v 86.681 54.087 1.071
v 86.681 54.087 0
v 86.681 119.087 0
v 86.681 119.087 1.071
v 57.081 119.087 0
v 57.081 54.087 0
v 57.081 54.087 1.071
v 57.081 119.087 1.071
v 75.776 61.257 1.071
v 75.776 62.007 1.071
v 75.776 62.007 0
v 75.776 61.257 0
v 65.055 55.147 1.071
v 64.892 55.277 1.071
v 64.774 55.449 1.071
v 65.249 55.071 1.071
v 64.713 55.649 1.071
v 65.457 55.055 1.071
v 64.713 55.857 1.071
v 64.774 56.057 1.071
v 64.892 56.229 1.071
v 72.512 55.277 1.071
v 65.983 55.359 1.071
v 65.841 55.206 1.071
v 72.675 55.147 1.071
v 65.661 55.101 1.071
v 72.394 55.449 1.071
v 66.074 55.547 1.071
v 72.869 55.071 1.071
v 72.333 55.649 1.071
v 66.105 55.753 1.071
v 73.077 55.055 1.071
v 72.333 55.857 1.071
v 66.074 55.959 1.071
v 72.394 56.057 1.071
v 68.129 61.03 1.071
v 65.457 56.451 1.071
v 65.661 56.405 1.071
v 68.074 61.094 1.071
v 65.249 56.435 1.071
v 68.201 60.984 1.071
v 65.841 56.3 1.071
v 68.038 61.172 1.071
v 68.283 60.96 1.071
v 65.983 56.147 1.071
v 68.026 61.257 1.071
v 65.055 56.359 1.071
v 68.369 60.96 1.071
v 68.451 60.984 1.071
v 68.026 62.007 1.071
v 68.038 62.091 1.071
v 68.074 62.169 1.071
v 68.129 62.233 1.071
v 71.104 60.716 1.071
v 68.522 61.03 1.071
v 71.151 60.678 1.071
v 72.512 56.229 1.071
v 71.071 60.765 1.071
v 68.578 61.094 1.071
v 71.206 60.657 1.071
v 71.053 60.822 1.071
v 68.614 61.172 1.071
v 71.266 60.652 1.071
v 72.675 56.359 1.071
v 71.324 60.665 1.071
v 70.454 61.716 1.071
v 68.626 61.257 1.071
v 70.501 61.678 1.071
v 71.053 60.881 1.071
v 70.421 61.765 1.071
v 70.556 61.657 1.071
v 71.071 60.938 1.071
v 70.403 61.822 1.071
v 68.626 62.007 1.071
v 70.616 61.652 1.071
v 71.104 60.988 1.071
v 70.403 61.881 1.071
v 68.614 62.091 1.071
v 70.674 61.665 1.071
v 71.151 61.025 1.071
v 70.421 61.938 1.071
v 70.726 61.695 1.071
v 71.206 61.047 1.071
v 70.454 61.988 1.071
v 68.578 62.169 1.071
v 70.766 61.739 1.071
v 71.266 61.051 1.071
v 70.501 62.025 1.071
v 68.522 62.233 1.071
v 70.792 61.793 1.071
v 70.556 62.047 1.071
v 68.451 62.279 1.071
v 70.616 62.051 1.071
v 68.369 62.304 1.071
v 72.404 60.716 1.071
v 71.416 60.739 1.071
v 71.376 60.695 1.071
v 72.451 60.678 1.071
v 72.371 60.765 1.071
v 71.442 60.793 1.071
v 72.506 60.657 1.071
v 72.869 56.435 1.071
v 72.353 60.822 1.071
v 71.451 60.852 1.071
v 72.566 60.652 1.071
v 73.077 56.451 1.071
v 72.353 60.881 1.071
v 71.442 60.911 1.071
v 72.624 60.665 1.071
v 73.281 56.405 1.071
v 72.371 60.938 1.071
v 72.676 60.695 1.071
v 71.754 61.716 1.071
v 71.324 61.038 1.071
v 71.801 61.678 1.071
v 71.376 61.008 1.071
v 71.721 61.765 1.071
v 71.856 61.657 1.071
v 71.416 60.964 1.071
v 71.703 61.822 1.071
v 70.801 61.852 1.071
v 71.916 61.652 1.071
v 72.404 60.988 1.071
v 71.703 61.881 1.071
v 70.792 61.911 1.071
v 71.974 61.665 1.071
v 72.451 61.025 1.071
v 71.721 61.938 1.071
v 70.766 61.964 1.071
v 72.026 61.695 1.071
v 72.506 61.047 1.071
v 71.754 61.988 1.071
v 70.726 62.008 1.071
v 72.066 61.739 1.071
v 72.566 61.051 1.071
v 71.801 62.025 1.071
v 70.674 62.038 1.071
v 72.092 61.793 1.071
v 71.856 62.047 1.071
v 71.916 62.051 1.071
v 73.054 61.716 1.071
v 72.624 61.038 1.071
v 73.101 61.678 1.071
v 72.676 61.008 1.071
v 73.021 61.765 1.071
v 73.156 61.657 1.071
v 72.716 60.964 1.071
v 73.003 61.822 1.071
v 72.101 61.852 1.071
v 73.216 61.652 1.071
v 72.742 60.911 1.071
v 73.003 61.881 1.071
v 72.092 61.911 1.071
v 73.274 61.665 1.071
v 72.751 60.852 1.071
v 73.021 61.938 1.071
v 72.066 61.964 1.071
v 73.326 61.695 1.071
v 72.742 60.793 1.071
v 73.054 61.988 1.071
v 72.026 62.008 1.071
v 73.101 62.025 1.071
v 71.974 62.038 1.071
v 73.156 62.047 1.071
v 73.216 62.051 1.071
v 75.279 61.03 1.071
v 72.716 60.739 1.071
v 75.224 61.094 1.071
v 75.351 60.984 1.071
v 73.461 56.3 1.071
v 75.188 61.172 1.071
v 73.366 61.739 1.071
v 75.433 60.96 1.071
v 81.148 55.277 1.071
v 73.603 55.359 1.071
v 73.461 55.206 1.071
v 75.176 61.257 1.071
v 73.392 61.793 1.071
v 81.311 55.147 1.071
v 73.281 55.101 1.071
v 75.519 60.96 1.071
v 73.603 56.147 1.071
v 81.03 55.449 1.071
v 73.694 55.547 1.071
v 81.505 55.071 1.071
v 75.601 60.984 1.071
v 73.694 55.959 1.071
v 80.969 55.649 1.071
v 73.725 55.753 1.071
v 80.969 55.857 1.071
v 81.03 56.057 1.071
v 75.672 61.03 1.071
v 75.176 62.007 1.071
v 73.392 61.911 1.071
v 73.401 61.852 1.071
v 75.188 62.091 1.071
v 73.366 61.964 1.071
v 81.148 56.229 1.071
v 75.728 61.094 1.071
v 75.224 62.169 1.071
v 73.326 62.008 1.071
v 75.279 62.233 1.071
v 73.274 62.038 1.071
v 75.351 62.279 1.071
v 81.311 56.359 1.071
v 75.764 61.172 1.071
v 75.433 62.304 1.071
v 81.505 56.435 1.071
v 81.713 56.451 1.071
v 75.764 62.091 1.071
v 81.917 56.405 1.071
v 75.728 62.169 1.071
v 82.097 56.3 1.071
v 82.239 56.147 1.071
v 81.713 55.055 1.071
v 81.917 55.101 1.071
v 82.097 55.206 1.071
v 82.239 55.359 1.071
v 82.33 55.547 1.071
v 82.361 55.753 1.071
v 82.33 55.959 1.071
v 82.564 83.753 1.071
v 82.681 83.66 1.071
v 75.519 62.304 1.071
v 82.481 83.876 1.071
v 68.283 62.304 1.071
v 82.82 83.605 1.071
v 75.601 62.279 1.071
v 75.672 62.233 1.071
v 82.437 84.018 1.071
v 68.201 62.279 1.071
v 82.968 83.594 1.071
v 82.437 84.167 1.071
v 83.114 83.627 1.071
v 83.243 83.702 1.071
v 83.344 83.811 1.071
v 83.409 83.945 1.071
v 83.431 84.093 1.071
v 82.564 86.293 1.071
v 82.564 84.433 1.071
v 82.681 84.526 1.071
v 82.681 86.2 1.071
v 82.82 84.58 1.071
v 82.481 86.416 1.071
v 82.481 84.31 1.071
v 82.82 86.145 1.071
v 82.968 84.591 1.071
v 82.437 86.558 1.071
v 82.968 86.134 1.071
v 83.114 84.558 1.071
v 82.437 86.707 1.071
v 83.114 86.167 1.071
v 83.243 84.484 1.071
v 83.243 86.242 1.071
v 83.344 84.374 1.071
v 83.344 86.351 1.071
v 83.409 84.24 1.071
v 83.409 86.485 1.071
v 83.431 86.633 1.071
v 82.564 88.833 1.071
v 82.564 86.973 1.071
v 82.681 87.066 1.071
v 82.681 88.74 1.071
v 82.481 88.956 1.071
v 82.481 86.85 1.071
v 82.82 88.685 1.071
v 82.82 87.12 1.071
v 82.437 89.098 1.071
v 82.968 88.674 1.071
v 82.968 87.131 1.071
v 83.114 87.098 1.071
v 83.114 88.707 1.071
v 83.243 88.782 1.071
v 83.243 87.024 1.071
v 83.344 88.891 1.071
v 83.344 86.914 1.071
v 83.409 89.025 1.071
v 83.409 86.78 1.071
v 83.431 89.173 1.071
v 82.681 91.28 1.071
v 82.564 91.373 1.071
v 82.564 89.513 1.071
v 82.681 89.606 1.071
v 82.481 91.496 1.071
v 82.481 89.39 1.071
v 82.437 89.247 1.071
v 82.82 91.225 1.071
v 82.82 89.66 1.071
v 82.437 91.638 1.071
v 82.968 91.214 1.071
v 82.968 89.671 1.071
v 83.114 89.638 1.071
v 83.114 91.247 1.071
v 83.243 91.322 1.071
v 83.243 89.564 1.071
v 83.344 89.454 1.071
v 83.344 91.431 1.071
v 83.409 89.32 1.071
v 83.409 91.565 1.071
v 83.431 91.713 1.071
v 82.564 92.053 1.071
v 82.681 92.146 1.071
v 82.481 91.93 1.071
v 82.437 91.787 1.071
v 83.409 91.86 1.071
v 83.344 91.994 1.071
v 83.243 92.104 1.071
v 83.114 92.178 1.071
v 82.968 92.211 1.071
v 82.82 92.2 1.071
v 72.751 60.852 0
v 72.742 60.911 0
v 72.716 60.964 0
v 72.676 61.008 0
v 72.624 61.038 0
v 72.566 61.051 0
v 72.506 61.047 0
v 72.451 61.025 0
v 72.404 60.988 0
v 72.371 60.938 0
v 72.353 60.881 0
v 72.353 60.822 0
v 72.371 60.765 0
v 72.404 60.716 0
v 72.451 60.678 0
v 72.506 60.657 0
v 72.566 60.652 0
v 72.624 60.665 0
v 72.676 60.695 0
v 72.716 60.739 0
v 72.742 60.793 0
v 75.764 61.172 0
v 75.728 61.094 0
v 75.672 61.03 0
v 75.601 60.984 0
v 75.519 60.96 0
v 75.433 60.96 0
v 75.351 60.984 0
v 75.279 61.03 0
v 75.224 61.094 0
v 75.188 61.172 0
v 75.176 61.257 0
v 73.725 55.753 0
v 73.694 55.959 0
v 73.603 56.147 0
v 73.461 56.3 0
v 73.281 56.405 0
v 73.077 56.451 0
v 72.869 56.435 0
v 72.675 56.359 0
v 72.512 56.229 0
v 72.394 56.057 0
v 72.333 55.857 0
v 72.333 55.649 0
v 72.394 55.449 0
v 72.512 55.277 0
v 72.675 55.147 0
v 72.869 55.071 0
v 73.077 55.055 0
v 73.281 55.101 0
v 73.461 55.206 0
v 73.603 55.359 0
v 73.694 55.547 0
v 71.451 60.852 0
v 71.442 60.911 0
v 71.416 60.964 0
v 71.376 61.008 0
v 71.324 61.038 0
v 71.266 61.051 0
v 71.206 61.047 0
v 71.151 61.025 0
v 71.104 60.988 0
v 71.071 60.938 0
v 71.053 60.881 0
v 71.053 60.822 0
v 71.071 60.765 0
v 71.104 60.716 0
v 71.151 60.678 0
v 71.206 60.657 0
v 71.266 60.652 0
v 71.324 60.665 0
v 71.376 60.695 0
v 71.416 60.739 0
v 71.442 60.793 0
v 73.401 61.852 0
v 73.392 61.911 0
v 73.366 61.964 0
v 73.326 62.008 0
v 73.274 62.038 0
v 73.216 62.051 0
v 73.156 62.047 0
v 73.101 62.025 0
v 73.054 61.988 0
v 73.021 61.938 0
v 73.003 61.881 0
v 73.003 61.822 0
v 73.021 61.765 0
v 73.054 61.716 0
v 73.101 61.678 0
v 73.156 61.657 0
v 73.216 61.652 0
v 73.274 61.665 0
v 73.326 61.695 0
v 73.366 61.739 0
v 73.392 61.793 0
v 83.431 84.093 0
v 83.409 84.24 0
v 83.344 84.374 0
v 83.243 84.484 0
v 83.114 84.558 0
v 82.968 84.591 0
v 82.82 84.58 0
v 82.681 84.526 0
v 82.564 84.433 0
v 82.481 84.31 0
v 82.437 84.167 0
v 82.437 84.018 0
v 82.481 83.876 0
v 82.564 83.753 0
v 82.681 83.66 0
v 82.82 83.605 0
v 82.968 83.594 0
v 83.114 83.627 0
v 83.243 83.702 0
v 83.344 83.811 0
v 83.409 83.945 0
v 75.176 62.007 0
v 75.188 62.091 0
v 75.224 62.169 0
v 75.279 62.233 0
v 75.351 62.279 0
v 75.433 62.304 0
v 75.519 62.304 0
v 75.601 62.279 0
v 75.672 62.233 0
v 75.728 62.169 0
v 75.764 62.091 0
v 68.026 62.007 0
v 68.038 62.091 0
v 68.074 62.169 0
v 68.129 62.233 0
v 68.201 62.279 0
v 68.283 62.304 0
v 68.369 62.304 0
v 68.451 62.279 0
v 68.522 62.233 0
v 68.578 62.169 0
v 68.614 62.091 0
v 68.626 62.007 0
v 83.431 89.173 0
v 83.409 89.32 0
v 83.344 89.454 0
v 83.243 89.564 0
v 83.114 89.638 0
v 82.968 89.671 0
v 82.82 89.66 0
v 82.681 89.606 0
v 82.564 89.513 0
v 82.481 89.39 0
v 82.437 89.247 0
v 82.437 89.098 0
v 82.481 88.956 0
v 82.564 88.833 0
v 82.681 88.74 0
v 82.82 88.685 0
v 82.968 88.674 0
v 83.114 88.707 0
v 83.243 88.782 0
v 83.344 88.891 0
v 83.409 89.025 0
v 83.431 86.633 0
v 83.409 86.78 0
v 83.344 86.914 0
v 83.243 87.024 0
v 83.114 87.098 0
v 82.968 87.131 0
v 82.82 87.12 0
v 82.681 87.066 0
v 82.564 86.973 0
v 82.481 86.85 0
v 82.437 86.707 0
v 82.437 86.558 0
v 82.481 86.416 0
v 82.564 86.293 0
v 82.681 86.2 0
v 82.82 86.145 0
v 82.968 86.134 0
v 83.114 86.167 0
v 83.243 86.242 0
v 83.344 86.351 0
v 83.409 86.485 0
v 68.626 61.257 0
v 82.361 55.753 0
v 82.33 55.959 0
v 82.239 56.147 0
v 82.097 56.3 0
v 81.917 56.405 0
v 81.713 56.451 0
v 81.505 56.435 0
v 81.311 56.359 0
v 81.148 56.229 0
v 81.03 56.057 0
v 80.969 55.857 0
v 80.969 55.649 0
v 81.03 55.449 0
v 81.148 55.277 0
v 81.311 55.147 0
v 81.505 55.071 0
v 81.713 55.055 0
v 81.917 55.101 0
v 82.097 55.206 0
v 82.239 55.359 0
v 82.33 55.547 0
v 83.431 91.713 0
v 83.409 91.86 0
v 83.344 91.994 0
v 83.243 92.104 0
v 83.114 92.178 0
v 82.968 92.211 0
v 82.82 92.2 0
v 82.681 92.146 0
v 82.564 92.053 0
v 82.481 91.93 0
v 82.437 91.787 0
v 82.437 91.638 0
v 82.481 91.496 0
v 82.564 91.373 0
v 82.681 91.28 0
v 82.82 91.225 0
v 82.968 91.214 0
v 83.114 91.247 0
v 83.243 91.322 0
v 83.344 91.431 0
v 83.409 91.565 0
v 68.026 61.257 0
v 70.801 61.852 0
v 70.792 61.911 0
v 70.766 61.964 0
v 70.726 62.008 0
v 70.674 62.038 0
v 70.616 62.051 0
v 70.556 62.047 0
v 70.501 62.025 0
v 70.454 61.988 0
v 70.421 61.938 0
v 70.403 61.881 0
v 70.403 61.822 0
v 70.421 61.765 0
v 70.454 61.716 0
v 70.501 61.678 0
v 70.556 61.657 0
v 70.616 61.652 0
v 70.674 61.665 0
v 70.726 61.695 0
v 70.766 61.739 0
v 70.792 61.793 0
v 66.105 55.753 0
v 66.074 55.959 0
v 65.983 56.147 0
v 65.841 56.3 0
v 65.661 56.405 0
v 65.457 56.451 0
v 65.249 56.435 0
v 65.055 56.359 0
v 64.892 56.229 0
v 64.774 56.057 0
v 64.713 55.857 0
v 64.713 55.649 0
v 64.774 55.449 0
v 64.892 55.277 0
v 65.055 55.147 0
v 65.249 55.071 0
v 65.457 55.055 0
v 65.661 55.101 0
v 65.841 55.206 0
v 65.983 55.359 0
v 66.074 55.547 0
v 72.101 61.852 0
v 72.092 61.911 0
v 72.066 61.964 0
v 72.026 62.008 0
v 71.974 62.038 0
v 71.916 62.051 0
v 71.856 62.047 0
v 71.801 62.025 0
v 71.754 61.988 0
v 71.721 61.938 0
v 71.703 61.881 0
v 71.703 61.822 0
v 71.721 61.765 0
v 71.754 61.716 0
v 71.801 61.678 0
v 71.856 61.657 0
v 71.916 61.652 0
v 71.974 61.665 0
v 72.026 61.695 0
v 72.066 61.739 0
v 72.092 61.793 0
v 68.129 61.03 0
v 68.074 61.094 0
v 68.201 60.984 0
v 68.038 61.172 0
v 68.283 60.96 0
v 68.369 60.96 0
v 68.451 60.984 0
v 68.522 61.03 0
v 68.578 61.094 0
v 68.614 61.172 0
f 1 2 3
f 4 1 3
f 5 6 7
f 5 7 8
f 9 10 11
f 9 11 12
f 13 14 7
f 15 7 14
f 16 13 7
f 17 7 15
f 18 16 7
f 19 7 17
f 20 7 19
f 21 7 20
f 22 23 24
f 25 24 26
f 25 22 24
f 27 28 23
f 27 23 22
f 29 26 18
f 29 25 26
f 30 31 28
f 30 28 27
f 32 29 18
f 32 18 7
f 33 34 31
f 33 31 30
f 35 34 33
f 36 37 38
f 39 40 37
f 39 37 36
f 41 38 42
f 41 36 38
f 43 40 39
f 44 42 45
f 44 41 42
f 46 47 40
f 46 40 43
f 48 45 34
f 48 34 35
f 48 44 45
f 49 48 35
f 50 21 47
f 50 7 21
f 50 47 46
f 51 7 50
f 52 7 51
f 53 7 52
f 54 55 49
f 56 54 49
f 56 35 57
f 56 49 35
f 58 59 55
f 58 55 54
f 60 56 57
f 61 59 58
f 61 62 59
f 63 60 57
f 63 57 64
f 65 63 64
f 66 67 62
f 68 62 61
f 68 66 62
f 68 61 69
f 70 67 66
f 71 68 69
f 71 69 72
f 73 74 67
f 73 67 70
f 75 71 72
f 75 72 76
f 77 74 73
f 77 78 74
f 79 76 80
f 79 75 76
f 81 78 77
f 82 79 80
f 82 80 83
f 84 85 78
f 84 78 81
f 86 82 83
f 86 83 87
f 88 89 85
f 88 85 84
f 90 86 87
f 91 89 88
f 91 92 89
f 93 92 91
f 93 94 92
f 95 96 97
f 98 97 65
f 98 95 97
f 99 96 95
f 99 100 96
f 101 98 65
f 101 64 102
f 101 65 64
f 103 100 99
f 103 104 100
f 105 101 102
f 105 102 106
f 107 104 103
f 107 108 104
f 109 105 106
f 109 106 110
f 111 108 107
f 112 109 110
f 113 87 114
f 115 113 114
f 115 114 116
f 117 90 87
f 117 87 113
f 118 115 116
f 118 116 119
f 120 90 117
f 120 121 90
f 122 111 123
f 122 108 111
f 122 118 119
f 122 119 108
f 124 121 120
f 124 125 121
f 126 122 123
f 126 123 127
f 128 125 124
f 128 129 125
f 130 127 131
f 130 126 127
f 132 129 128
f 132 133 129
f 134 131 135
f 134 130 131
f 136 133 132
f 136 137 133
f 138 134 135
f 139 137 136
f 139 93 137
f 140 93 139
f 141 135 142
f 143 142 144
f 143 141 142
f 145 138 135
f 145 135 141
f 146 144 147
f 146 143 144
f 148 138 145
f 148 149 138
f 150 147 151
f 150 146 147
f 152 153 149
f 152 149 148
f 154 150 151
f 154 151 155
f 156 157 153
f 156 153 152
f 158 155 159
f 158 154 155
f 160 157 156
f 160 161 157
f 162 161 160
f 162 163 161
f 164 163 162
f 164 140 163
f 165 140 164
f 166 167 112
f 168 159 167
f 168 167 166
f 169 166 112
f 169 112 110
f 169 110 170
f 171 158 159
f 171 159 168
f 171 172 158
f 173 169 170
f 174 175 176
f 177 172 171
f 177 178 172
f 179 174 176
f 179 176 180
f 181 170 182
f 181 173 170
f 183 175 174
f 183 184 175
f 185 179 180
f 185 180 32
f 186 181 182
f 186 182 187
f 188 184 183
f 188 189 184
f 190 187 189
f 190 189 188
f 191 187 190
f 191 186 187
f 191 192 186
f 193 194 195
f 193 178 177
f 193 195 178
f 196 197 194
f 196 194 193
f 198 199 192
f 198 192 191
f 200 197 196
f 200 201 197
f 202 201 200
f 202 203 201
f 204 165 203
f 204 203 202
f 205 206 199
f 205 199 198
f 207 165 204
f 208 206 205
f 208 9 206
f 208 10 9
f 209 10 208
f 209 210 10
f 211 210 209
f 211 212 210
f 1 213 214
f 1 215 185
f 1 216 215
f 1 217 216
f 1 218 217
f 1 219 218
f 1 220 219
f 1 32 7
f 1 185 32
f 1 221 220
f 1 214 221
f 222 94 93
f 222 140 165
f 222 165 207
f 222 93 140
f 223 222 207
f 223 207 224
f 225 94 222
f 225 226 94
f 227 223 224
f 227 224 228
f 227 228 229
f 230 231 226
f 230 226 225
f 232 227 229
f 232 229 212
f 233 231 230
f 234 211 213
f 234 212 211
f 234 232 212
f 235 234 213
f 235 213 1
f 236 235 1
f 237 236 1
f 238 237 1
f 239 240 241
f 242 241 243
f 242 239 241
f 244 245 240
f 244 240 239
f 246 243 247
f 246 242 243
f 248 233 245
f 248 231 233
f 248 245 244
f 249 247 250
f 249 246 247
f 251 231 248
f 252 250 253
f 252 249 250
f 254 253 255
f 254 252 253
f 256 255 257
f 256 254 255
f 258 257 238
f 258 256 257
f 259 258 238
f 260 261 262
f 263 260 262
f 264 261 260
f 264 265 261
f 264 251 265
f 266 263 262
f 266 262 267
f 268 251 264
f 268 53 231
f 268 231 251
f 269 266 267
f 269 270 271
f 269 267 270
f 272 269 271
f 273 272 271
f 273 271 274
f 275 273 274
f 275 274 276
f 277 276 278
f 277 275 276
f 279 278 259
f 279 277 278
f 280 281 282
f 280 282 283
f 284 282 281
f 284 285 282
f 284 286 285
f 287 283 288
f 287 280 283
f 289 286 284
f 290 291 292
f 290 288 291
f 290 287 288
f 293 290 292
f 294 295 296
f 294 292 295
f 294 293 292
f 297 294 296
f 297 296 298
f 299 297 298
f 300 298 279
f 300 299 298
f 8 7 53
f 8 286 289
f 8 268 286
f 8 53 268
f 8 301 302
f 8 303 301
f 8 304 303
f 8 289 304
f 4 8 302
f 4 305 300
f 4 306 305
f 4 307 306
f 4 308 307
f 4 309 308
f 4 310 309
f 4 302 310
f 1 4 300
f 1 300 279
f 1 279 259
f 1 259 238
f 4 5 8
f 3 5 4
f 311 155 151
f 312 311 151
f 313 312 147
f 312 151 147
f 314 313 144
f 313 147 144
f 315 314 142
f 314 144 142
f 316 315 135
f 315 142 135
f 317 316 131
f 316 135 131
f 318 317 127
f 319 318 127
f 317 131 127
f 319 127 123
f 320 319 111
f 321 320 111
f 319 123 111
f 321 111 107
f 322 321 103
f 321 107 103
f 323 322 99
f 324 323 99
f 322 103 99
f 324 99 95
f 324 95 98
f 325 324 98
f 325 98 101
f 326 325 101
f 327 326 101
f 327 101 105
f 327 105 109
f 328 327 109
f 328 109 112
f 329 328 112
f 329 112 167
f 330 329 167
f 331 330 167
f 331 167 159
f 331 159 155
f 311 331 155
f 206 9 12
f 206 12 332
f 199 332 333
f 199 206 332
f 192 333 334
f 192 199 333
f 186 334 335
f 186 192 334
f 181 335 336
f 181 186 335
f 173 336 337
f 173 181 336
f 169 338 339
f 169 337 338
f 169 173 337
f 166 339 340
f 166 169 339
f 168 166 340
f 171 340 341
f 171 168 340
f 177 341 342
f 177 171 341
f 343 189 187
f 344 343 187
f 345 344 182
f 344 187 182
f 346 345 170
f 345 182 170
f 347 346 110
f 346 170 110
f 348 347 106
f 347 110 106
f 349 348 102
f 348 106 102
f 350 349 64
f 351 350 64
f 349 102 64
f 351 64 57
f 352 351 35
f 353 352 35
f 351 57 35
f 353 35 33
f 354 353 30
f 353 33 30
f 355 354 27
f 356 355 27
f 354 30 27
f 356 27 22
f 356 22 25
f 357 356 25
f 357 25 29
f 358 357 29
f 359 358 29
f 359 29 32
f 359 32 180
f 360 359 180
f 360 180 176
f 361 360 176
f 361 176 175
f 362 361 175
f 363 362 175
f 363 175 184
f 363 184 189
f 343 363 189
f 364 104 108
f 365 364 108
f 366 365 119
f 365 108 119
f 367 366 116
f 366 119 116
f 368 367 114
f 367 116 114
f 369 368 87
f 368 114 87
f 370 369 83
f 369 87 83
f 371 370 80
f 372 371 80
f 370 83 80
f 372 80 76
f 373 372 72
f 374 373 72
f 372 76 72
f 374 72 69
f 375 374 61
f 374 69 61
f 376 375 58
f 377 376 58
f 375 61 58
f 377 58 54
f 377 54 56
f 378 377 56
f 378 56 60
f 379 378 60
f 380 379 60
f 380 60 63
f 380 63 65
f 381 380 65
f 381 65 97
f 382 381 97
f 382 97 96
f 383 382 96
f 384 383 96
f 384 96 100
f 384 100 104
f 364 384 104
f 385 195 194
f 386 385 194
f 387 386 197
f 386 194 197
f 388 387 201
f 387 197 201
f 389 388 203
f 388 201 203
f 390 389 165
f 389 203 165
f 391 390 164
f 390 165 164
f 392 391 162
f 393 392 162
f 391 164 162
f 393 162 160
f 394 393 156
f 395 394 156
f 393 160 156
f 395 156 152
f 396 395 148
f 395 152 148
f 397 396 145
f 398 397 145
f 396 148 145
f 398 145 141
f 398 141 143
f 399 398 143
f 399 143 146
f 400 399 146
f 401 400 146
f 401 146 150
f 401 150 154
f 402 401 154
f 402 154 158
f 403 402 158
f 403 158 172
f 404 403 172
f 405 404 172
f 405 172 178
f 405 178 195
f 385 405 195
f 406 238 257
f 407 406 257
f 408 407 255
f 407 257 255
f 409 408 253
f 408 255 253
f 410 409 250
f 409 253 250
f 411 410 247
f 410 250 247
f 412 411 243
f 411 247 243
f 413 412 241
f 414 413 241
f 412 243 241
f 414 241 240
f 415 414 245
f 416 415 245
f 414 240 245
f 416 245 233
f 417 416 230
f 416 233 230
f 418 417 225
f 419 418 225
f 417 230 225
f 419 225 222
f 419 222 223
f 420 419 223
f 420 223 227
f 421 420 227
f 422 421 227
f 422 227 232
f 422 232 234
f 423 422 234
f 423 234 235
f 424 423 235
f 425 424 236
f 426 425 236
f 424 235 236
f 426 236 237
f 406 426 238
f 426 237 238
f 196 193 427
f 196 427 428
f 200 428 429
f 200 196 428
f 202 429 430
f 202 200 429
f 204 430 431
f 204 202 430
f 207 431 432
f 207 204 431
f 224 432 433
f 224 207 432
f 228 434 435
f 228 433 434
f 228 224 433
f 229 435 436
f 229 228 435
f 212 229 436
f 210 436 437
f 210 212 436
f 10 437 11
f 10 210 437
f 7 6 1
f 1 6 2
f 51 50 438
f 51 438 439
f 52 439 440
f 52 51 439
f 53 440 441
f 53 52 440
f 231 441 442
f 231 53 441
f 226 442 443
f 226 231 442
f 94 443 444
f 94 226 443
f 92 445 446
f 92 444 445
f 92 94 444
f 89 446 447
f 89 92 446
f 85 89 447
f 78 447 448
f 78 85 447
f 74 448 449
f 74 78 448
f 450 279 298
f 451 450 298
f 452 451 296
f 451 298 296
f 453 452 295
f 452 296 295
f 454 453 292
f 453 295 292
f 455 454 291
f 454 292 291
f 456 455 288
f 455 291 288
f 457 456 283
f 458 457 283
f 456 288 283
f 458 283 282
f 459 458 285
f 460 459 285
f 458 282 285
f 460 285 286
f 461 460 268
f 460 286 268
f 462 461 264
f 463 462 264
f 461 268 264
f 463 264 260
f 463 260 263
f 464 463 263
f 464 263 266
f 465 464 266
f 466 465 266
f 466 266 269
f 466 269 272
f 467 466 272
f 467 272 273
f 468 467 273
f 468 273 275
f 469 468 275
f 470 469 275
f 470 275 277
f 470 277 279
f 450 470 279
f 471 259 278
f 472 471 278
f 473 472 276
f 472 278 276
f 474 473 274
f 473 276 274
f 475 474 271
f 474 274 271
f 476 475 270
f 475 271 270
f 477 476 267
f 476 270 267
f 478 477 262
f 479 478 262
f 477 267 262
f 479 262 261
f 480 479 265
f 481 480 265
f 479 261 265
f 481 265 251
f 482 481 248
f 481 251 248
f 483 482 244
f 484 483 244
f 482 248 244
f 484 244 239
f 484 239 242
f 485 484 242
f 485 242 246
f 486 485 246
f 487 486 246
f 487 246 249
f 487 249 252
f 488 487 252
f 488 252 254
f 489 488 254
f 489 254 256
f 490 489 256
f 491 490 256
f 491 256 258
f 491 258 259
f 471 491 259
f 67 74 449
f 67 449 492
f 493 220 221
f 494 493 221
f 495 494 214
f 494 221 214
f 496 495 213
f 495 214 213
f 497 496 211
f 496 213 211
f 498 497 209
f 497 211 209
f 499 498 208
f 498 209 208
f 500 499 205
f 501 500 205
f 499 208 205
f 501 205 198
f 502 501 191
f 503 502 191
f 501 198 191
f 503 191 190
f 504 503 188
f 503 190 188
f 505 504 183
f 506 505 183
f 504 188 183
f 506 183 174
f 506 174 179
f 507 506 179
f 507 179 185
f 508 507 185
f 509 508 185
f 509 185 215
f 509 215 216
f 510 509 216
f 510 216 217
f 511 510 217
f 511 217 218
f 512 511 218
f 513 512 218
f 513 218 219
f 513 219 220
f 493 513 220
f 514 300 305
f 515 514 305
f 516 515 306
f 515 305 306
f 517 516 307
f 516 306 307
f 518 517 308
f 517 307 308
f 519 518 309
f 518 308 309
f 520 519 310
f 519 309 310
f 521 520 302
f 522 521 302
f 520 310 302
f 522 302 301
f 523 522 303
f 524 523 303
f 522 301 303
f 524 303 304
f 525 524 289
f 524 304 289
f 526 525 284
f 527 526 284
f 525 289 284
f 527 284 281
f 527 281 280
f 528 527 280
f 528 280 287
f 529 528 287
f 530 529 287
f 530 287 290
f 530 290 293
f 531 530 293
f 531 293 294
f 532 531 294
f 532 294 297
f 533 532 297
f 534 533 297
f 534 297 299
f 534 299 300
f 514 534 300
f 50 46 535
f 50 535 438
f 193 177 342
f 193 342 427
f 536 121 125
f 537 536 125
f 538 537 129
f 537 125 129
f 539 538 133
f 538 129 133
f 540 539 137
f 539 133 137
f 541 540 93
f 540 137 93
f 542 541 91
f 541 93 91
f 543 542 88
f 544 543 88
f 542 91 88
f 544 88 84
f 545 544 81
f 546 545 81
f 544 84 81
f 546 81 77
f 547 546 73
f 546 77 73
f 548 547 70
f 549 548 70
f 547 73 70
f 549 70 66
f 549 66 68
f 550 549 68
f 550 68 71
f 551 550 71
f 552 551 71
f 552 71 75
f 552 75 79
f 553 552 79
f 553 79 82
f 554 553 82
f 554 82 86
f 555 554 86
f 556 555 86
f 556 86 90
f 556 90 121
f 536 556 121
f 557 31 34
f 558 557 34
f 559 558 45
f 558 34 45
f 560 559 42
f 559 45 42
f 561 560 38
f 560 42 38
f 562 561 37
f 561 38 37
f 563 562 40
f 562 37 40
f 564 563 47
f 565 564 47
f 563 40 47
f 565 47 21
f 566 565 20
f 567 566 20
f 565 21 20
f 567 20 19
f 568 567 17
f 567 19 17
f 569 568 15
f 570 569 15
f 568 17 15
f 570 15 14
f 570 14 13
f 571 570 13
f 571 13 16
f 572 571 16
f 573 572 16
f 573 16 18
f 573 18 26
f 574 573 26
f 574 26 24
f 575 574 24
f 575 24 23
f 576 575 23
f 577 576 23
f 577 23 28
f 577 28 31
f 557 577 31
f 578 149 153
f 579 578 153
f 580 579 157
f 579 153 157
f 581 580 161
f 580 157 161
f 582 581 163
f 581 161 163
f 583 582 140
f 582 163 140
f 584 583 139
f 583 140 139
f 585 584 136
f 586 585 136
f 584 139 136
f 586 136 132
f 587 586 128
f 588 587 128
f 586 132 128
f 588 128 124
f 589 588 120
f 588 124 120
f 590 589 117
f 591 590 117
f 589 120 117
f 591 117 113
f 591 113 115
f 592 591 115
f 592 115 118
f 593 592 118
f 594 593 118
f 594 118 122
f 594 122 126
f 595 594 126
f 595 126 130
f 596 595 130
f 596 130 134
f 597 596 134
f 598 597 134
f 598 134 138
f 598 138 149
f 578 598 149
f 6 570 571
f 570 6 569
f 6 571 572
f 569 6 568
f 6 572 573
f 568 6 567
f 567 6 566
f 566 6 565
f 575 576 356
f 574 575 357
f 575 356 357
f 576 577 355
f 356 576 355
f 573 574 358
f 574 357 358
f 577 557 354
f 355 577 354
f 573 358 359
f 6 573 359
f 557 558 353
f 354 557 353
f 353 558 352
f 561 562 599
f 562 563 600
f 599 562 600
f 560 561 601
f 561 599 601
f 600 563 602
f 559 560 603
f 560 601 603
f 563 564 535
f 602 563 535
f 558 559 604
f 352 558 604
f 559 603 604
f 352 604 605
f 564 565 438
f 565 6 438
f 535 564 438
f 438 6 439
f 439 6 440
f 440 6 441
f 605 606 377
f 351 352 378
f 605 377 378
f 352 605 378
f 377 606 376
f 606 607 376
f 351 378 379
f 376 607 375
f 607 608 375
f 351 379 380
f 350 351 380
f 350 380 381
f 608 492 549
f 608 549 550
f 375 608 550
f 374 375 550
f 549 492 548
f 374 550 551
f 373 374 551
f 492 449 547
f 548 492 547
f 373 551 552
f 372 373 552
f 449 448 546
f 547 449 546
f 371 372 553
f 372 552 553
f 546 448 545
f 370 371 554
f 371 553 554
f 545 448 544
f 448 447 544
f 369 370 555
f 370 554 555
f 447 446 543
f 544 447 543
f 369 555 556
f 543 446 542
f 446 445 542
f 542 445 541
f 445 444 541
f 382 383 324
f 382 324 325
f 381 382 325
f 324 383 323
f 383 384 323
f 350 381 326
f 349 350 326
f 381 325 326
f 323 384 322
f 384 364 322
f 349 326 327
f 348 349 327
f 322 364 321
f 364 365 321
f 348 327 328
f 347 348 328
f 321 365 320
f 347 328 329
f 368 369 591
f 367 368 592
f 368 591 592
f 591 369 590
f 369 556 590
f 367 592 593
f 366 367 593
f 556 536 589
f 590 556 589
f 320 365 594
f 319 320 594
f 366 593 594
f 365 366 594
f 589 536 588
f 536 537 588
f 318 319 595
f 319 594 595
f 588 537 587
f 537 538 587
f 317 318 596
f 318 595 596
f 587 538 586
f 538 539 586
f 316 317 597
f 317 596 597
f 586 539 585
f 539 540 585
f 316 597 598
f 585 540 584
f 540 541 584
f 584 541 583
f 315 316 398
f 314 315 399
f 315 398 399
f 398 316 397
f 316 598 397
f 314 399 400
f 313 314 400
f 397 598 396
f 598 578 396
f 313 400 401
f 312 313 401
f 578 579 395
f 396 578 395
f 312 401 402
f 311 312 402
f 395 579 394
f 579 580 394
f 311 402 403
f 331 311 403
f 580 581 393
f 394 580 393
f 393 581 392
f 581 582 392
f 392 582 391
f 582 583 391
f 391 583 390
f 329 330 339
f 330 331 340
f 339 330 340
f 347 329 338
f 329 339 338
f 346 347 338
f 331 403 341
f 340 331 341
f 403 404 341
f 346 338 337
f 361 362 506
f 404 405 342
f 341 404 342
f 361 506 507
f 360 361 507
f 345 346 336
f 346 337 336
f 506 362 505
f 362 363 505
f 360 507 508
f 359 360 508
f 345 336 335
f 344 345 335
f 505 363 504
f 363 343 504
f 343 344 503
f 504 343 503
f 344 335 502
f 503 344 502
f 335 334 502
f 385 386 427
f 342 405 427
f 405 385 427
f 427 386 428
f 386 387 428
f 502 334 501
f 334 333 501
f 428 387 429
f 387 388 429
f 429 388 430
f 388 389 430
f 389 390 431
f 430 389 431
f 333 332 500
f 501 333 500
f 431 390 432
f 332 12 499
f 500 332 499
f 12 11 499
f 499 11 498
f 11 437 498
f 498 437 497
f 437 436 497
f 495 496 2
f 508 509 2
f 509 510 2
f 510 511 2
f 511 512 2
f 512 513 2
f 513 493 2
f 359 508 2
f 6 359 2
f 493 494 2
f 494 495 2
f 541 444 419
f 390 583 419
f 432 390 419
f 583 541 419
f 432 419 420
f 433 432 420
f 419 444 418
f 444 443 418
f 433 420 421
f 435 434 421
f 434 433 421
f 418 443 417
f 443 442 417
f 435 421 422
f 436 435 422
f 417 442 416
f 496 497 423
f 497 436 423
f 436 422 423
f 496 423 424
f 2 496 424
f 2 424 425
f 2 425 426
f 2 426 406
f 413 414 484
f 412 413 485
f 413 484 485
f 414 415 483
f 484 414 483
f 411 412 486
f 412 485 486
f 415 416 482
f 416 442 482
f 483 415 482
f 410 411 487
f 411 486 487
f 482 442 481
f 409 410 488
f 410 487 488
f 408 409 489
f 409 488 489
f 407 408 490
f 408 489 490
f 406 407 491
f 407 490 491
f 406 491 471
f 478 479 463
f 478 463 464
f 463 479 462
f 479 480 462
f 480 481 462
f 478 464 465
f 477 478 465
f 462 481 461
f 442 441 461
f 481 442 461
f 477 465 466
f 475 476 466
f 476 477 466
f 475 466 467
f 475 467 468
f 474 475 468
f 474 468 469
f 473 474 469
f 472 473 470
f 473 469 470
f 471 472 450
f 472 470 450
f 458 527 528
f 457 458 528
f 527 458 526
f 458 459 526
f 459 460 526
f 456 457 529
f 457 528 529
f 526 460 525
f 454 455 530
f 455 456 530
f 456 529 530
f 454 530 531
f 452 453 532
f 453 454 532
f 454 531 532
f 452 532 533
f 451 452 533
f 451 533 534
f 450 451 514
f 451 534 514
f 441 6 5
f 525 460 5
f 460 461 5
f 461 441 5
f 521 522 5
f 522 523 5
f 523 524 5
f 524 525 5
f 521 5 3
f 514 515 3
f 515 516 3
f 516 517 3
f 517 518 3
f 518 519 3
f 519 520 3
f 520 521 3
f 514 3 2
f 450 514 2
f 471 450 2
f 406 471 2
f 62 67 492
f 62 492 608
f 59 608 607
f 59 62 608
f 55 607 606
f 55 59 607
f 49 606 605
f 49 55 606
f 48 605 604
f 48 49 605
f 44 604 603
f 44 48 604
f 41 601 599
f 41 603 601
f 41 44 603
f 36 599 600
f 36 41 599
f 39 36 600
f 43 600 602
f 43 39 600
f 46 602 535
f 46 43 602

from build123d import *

# Parameters (mm, degrees)
SKETCH_1_W         = 29.6
SKETCH_1_H         = 65
BOARD_DEPTH        = 1.07112
SKETCH_13_R        = 0.5
HOLE_OLED1_4_DEPTH = 1.07112
SKETCH_14_R        = 0.5
HOLE_OLED1_3_DEPTH = 148.296881579
SKETCH_15_R        = 0.5
HOLE_OLED1_2_DEPTH = 148.296881579
SKETCH_16_R        = 0.5
HOLE_OLED1_1_DEPTH = 148.296881579
SKETCH_17_R        = 0.7
HOLE_FREE_4_DEPTH  = 148.296881579
SKETCH_18_R        = 0.7
HOLE_FREE_3_DEPTH  = 148.296881579
SKETCH_19_R        = 0.7
HOLE_FREE_2_DEPTH  = 148.296881579
HOLE_J1_6_DEPTH    = 148.296881579
HOLE_J1_7_DEPTH    = 148.296881579
SKETCH_24_R        = 0.2
HOLE_J1_1_DEPTH    = 148.296881579
SKETCH_25_R        = 0.2
HOLE_J1_2_DEPTH    = 148.296881579
SKETCH_26_R        = 0.2
HOLE_J1_3_DEPTH    = 148.296881579
SKETCH_27_R        = 0.2
HOLE_J1_4_DEPTH    = 148.296881579
SKETCH_28_R        = 0.2
HOLE_J1_5_DEPTH    = 148.296881579


with BuildPart() as part:
    # Эскиз1 → Board (new body)
    with BuildSketch(Plane.XY):
        with Locations((71.88103, 86.58662)):
            Rectangle(SKETCH_1_W, SKETCH_1_H)
    extrude(amount=BOARD_DEPTH)

    # Эскиз13 → Hole - OLED1-4 (cut)
    with BuildSketch(Plane.XY.offset(1.07112)):
        with Locations((82.93099, 84.09263)):
            Circle(SKETCH_13_R)
    extrude(amount=-HOLE_OLED1_4_DEPTH, mode=Mode.SUBTRACT)

    # Эскиз14 → Hole - OLED1-3 (cut, through all)
    with BuildSketch(Plane.XY.offset(1.07112)):
        with Locations((82.931, 86.63263)):
            Circle(SKETCH_14_R)
    extrude(amount=-HOLE_OLED1_3_DEPTH, mode=Mode.SUBTRACT)

    # Эскиз15 → Hole - OLED1-2 (cut, through all)
    with BuildSketch(Plane.XY.offset(1.07112)):
        with Locations((82.931, 89.17263)):
            Circle(SKETCH_15_R)
    extrude(amount=-HOLE_OLED1_2_DEPTH, mode=Mode.SUBTRACT)

    # Эскиз16 → Hole - OLED1-1 (cut, through all)
    with BuildSketch(Plane.XY.offset(1.07112)):
        with Locations((82.931, 91.71263)):
            Circle(SKETCH_16_R)
    extrude(amount=-HOLE_OLED1_1_DEPTH, mode=Mode.SUBTRACT)

    # Эскиз17 → Hole - Free-4 (cut, through all)
    with BuildSketch(Plane.XY.offset(1.07112)):
        with Locations((73.025, 55.753)):
            Circle(SKETCH_17_R)
    extrude(amount=-HOLE_FREE_4_DEPTH, mode=Mode.SUBTRACT)

    # Эскиз18 → Hole - Free-3 (cut, through all)
    with BuildSketch(Plane.XY.offset(1.07112)):
        with Locations((81.661, 55.753)):
            Circle(SKETCH_18_R)
    extrude(amount=-HOLE_FREE_3_DEPTH, mode=Mode.SUBTRACT)

    # Эскиз19 → Hole - Free-2 (cut, through all)
    with BuildSketch(Plane.XY.offset(1.07112)):
        with Locations((65.405, 55.753)):
            Circle(SKETCH_19_R)
    extrude(amount=-HOLE_FREE_2_DEPTH, mode=Mode.SUBTRACT)

    # Эскиз21 → Hole - J1-6 (cut, through all)
    with BuildSketch(Plane.XY.offset(1.07112)):
        with BuildLine():
            Line((68.0259, 61.25658), (68.0259, 62.00658))
            ThreePointArc((68.0259, 62.00658), (68.3259, 62.30658), (68.6259, 62.00658))
            Line((68.6259, 62.00658), (68.6259, 61.25658))
            ThreePointArc((68.6259, 61.25658), (68.3259, 60.95658), (68.0259, 61.25658))
        make_face()
    extrude(amount=-HOLE_J1_6_DEPTH, mode=Mode.SUBTRACT)

    # Эскиз23 → Hole - J1-7 (cut, through all)
    with BuildSketch(Plane.XY.offset(1.07112)):
        with BuildLine():
            Line((75.17589, 61.25658), (75.17589, 62.00658))
            ThreePointArc((75.17589, 62.00658), (75.47589, 62.30658), (75.77589, 62.00658))
            Line((75.77589, 62.00658), (75.77589, 61.25658))
            ThreePointArc((75.77589, 61.25658), (75.47589, 60.95658), (75.17589, 61.25658))
        make_face()
    extrude(amount=-HOLE_J1_7_DEPTH, mode=Mode.SUBTRACT)

    # Эскиз24 → Hole - J1-1 (cut, through all)
    with BuildSketch(Plane.XY.offset(1.07112)):
        with Locations((70.6009, 61.85156)):
            Circle(SKETCH_24_R)
    extrude(amount=-HOLE_J1_1_DEPTH, mode=Mode.SUBTRACT)

    # Эскиз25 → Hole - J1-2 (cut, through all)
    with BuildSketch(Plane.XY.offset(1.07112)):
        with Locations((71.25089, 60.85157)):
            Circle(SKETCH_25_R)
    extrude(amount=-HOLE_J1_2_DEPTH, mode=Mode.SUBTRACT)

    # Эскиз26 → Hole - J1-3 (cut, through all)
    with BuildSketch(Plane.XY.offset(1.07112)):
        with Locations((71.90091, 61.85157)):
            Circle(SKETCH_26_R)
    extrude(amount=-HOLE_J1_3_DEPTH, mode=Mode.SUBTRACT)

    # Эскиз27 → Hole - J1-4 (cut, through all)
    with BuildSketch(Plane.XY.offset(1.07112)):
        with Locations((72.55091, 60.85157)):
            Circle(SKETCH_27_R)
    extrude(amount=-HOLE_J1_4_DEPTH, mode=Mode.SUBTRACT)

    # Эскиз28 → Hole - J1-5 (cut, through all)
    with BuildSketch(Plane.XY.offset(1.07112)):
        with Locations((73.20089, 61.85158)):
            Circle(SKETCH_28_R)
    extrude(amount=-HOLE_J1_5_DEPTH, mode=Mode.SUBTRACT)


solid = part.part
